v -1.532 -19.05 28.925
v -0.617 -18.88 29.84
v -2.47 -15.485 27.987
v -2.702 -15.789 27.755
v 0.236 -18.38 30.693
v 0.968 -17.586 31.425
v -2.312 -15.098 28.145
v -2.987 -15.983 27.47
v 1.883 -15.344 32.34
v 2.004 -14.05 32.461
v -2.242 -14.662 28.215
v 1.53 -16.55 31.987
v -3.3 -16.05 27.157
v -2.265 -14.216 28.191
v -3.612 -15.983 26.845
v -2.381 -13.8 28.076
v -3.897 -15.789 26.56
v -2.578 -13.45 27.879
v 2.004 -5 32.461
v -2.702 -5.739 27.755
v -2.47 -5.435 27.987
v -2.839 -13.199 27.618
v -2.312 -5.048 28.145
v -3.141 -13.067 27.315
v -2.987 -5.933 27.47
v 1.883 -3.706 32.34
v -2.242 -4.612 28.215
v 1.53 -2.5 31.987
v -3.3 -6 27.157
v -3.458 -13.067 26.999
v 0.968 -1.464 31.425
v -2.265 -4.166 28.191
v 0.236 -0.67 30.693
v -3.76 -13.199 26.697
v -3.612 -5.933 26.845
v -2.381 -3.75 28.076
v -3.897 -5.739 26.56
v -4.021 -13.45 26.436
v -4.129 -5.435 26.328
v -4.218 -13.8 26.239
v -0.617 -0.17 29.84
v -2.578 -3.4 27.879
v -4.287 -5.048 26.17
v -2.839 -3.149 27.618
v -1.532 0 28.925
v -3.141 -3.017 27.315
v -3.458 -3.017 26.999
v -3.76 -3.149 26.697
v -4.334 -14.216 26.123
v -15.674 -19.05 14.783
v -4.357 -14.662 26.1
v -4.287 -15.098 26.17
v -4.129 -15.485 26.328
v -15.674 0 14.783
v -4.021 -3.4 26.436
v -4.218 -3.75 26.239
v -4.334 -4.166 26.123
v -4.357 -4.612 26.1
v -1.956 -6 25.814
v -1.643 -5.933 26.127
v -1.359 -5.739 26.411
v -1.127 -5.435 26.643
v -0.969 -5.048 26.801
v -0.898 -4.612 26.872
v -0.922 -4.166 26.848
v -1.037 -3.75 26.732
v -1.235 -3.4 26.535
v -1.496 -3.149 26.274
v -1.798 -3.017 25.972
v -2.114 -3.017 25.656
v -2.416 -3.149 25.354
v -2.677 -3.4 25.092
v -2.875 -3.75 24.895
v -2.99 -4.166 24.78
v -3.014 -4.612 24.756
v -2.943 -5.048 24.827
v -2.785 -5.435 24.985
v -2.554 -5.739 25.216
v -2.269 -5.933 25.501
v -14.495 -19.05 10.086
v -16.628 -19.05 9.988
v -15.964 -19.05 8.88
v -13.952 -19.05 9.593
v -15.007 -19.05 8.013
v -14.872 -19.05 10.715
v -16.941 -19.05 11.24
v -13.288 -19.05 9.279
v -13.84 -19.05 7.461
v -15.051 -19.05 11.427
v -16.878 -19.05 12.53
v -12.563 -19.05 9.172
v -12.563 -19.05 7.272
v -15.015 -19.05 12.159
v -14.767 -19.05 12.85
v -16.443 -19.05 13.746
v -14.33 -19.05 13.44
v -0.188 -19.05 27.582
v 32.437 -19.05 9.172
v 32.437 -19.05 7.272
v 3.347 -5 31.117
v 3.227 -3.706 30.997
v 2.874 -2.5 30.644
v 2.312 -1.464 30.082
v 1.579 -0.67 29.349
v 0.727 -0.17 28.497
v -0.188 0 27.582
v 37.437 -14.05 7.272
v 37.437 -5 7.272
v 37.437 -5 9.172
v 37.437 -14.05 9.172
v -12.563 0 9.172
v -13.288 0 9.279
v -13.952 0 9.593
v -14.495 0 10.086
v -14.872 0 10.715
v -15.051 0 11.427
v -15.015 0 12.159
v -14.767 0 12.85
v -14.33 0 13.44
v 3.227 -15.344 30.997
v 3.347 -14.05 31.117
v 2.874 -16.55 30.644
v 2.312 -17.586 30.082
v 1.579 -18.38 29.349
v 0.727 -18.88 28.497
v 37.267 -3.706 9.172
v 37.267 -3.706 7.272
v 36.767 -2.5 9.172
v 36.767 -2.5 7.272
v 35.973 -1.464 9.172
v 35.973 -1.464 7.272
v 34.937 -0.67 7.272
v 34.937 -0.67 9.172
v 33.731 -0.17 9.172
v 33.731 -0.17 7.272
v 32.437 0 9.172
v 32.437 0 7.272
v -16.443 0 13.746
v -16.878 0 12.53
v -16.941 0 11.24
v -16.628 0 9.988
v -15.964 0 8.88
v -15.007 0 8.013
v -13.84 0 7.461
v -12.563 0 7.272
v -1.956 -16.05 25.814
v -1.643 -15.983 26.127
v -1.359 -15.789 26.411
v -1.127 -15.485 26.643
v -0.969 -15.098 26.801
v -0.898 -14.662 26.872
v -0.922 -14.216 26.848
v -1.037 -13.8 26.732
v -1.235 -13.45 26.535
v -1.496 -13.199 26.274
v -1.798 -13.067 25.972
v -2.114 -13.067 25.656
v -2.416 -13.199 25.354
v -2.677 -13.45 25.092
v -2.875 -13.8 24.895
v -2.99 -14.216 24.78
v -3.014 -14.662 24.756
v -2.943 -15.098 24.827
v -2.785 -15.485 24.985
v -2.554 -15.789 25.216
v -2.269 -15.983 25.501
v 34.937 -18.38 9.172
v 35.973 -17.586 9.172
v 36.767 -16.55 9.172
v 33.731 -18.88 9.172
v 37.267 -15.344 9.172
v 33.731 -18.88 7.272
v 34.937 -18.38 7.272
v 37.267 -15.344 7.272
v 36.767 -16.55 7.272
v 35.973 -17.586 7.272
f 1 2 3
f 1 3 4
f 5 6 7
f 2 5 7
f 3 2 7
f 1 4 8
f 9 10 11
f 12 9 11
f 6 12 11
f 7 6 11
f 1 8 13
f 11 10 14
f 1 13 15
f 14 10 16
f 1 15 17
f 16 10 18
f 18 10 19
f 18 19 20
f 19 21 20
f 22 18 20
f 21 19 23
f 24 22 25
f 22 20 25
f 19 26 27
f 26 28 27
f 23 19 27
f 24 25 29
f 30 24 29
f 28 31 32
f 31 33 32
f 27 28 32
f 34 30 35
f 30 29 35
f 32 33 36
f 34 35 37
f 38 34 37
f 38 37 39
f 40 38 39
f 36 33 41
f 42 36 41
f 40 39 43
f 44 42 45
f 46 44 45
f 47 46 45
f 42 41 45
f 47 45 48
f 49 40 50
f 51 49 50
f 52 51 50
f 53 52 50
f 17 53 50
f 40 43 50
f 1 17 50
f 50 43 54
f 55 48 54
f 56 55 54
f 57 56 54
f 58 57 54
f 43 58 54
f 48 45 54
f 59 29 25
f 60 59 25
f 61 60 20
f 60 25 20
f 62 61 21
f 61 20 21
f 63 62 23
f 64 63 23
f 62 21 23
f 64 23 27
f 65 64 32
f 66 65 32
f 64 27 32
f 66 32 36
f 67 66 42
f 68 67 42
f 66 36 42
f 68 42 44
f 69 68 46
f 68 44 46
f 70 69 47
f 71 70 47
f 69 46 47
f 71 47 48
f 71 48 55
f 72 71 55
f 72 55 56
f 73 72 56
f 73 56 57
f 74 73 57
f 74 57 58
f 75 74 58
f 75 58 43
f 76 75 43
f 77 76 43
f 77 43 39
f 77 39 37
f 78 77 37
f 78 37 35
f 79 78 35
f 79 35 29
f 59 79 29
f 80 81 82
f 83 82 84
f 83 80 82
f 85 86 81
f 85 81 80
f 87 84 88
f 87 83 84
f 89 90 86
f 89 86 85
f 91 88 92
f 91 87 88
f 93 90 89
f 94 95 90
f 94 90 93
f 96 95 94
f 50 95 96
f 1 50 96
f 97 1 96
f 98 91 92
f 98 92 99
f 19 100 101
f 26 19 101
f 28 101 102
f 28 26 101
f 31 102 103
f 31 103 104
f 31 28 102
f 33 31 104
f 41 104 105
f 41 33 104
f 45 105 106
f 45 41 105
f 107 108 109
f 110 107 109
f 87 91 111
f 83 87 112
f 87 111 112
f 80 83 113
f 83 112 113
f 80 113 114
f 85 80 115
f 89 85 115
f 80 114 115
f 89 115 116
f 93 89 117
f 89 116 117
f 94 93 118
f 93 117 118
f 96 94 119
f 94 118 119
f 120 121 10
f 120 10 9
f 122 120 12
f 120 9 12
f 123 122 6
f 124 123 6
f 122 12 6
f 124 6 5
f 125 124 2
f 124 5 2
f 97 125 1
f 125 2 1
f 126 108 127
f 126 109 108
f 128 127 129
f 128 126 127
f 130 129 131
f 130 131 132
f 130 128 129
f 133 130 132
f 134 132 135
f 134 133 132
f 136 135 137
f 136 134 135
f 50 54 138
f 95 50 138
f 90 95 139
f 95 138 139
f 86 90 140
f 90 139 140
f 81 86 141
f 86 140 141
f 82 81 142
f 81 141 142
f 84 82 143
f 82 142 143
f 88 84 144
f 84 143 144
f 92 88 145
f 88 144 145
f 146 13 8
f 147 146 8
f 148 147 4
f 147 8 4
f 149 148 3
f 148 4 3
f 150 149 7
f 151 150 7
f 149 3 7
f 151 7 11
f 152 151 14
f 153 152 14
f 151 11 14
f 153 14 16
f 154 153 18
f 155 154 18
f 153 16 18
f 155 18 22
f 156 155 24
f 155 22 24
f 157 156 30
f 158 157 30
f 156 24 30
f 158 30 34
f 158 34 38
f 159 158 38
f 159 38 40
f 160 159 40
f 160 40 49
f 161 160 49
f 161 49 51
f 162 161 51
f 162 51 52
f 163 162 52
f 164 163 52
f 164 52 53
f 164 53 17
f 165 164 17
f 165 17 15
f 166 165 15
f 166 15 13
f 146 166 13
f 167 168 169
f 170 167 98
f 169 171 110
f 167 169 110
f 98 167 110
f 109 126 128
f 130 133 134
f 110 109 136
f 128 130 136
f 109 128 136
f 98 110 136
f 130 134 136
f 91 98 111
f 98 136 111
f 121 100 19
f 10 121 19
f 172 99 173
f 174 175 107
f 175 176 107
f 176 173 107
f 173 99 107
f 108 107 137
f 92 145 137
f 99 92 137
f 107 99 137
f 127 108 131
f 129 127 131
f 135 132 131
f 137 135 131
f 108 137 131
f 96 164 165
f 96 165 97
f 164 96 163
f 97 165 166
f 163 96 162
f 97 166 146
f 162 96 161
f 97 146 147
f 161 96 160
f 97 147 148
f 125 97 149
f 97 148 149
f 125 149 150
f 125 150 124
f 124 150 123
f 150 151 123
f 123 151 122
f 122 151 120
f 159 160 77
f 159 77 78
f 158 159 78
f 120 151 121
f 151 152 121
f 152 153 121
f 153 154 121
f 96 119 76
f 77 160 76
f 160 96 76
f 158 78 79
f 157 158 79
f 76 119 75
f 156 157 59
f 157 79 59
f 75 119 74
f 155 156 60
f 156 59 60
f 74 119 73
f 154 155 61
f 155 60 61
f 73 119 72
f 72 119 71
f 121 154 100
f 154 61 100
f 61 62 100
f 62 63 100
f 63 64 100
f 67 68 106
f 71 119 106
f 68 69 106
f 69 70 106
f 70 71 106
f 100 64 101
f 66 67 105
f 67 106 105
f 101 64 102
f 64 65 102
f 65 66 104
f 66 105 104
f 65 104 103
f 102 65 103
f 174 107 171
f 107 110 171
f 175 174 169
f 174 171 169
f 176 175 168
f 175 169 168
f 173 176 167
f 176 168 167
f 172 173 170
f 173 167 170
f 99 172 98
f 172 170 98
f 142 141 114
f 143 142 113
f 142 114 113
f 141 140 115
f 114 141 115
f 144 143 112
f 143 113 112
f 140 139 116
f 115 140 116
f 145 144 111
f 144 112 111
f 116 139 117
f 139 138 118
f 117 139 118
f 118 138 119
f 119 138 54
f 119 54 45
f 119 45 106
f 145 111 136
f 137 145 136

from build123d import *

# Parameters (mm, degrees)
F1_DEPTH = 19.05
F2_R     = 5
F3_R     = 1.5
F4_DEPTH = 2.6


with BuildPart() as f1:
    # F0 (on Front) → F1 (new body)
    with BuildSketch(Plane.XZ):
        with BuildLine():
            Line((3.3472654321, 31.1172038595), (2.0037624331, 32.4607068585))
            Line((2.0037624331, 32.4607068585), (-15.6739070966, 14.7830373289))
            ThreePointArc((-15.6739070966, 14.7830373289), (-16.6277072024, 9.9879603892), (-12.5626372594, 7.2717674916))
            Line((-12.5626372594, 7.2717674916), (37.4373627406, 7.2717674916))
            Line((37.4373627406, 7.2717674916), (37.4373627406, 9.1717676539))
            Line((37.4373627406, 9.1717676539), (-12.5626372594, 9.1717676539))
            ThreePointArc((-12.5626372594, 9.1717676539), (-14.8723359407, 10.7150589728), (-14.3304040976, 13.4395343299))
            Line((-14.3304040976, 13.4395343299), (3.3472654321, 31.1172038595))
        make_face()
    extrude(amount=F1_DEPTH)

    # F2
    f2_edges = [f1.edges().sort_by_distance(p)[0] for p in [
        (37.437363, -19.05, 8.221768),
        (37.437363, 0, 8.221768),
        (2.675514, -19.05, 31.788955),
        (2.675514, 0, 31.788955),
    ]]
    fillet(f2_edges, radius=F2_R)

    # F3 (on face) → F4 (cut)
    with BuildSketch(Plane(origin=(-15.2284722127, 0, 15.2284722127), x_dir=(0, -1, 0), z_dir=(-0.7071067812, 0, 0.7071067812))):
        with Locations((4.5, 16.8700599461)):
            Circle(F3_R)
        with Locations((14.55, 16.8700599461)):
            Circle(F3_R)
    extrude(amount=-F4_DEPTH, mode=Mode.SUBTRACT)


solid = f1.part
